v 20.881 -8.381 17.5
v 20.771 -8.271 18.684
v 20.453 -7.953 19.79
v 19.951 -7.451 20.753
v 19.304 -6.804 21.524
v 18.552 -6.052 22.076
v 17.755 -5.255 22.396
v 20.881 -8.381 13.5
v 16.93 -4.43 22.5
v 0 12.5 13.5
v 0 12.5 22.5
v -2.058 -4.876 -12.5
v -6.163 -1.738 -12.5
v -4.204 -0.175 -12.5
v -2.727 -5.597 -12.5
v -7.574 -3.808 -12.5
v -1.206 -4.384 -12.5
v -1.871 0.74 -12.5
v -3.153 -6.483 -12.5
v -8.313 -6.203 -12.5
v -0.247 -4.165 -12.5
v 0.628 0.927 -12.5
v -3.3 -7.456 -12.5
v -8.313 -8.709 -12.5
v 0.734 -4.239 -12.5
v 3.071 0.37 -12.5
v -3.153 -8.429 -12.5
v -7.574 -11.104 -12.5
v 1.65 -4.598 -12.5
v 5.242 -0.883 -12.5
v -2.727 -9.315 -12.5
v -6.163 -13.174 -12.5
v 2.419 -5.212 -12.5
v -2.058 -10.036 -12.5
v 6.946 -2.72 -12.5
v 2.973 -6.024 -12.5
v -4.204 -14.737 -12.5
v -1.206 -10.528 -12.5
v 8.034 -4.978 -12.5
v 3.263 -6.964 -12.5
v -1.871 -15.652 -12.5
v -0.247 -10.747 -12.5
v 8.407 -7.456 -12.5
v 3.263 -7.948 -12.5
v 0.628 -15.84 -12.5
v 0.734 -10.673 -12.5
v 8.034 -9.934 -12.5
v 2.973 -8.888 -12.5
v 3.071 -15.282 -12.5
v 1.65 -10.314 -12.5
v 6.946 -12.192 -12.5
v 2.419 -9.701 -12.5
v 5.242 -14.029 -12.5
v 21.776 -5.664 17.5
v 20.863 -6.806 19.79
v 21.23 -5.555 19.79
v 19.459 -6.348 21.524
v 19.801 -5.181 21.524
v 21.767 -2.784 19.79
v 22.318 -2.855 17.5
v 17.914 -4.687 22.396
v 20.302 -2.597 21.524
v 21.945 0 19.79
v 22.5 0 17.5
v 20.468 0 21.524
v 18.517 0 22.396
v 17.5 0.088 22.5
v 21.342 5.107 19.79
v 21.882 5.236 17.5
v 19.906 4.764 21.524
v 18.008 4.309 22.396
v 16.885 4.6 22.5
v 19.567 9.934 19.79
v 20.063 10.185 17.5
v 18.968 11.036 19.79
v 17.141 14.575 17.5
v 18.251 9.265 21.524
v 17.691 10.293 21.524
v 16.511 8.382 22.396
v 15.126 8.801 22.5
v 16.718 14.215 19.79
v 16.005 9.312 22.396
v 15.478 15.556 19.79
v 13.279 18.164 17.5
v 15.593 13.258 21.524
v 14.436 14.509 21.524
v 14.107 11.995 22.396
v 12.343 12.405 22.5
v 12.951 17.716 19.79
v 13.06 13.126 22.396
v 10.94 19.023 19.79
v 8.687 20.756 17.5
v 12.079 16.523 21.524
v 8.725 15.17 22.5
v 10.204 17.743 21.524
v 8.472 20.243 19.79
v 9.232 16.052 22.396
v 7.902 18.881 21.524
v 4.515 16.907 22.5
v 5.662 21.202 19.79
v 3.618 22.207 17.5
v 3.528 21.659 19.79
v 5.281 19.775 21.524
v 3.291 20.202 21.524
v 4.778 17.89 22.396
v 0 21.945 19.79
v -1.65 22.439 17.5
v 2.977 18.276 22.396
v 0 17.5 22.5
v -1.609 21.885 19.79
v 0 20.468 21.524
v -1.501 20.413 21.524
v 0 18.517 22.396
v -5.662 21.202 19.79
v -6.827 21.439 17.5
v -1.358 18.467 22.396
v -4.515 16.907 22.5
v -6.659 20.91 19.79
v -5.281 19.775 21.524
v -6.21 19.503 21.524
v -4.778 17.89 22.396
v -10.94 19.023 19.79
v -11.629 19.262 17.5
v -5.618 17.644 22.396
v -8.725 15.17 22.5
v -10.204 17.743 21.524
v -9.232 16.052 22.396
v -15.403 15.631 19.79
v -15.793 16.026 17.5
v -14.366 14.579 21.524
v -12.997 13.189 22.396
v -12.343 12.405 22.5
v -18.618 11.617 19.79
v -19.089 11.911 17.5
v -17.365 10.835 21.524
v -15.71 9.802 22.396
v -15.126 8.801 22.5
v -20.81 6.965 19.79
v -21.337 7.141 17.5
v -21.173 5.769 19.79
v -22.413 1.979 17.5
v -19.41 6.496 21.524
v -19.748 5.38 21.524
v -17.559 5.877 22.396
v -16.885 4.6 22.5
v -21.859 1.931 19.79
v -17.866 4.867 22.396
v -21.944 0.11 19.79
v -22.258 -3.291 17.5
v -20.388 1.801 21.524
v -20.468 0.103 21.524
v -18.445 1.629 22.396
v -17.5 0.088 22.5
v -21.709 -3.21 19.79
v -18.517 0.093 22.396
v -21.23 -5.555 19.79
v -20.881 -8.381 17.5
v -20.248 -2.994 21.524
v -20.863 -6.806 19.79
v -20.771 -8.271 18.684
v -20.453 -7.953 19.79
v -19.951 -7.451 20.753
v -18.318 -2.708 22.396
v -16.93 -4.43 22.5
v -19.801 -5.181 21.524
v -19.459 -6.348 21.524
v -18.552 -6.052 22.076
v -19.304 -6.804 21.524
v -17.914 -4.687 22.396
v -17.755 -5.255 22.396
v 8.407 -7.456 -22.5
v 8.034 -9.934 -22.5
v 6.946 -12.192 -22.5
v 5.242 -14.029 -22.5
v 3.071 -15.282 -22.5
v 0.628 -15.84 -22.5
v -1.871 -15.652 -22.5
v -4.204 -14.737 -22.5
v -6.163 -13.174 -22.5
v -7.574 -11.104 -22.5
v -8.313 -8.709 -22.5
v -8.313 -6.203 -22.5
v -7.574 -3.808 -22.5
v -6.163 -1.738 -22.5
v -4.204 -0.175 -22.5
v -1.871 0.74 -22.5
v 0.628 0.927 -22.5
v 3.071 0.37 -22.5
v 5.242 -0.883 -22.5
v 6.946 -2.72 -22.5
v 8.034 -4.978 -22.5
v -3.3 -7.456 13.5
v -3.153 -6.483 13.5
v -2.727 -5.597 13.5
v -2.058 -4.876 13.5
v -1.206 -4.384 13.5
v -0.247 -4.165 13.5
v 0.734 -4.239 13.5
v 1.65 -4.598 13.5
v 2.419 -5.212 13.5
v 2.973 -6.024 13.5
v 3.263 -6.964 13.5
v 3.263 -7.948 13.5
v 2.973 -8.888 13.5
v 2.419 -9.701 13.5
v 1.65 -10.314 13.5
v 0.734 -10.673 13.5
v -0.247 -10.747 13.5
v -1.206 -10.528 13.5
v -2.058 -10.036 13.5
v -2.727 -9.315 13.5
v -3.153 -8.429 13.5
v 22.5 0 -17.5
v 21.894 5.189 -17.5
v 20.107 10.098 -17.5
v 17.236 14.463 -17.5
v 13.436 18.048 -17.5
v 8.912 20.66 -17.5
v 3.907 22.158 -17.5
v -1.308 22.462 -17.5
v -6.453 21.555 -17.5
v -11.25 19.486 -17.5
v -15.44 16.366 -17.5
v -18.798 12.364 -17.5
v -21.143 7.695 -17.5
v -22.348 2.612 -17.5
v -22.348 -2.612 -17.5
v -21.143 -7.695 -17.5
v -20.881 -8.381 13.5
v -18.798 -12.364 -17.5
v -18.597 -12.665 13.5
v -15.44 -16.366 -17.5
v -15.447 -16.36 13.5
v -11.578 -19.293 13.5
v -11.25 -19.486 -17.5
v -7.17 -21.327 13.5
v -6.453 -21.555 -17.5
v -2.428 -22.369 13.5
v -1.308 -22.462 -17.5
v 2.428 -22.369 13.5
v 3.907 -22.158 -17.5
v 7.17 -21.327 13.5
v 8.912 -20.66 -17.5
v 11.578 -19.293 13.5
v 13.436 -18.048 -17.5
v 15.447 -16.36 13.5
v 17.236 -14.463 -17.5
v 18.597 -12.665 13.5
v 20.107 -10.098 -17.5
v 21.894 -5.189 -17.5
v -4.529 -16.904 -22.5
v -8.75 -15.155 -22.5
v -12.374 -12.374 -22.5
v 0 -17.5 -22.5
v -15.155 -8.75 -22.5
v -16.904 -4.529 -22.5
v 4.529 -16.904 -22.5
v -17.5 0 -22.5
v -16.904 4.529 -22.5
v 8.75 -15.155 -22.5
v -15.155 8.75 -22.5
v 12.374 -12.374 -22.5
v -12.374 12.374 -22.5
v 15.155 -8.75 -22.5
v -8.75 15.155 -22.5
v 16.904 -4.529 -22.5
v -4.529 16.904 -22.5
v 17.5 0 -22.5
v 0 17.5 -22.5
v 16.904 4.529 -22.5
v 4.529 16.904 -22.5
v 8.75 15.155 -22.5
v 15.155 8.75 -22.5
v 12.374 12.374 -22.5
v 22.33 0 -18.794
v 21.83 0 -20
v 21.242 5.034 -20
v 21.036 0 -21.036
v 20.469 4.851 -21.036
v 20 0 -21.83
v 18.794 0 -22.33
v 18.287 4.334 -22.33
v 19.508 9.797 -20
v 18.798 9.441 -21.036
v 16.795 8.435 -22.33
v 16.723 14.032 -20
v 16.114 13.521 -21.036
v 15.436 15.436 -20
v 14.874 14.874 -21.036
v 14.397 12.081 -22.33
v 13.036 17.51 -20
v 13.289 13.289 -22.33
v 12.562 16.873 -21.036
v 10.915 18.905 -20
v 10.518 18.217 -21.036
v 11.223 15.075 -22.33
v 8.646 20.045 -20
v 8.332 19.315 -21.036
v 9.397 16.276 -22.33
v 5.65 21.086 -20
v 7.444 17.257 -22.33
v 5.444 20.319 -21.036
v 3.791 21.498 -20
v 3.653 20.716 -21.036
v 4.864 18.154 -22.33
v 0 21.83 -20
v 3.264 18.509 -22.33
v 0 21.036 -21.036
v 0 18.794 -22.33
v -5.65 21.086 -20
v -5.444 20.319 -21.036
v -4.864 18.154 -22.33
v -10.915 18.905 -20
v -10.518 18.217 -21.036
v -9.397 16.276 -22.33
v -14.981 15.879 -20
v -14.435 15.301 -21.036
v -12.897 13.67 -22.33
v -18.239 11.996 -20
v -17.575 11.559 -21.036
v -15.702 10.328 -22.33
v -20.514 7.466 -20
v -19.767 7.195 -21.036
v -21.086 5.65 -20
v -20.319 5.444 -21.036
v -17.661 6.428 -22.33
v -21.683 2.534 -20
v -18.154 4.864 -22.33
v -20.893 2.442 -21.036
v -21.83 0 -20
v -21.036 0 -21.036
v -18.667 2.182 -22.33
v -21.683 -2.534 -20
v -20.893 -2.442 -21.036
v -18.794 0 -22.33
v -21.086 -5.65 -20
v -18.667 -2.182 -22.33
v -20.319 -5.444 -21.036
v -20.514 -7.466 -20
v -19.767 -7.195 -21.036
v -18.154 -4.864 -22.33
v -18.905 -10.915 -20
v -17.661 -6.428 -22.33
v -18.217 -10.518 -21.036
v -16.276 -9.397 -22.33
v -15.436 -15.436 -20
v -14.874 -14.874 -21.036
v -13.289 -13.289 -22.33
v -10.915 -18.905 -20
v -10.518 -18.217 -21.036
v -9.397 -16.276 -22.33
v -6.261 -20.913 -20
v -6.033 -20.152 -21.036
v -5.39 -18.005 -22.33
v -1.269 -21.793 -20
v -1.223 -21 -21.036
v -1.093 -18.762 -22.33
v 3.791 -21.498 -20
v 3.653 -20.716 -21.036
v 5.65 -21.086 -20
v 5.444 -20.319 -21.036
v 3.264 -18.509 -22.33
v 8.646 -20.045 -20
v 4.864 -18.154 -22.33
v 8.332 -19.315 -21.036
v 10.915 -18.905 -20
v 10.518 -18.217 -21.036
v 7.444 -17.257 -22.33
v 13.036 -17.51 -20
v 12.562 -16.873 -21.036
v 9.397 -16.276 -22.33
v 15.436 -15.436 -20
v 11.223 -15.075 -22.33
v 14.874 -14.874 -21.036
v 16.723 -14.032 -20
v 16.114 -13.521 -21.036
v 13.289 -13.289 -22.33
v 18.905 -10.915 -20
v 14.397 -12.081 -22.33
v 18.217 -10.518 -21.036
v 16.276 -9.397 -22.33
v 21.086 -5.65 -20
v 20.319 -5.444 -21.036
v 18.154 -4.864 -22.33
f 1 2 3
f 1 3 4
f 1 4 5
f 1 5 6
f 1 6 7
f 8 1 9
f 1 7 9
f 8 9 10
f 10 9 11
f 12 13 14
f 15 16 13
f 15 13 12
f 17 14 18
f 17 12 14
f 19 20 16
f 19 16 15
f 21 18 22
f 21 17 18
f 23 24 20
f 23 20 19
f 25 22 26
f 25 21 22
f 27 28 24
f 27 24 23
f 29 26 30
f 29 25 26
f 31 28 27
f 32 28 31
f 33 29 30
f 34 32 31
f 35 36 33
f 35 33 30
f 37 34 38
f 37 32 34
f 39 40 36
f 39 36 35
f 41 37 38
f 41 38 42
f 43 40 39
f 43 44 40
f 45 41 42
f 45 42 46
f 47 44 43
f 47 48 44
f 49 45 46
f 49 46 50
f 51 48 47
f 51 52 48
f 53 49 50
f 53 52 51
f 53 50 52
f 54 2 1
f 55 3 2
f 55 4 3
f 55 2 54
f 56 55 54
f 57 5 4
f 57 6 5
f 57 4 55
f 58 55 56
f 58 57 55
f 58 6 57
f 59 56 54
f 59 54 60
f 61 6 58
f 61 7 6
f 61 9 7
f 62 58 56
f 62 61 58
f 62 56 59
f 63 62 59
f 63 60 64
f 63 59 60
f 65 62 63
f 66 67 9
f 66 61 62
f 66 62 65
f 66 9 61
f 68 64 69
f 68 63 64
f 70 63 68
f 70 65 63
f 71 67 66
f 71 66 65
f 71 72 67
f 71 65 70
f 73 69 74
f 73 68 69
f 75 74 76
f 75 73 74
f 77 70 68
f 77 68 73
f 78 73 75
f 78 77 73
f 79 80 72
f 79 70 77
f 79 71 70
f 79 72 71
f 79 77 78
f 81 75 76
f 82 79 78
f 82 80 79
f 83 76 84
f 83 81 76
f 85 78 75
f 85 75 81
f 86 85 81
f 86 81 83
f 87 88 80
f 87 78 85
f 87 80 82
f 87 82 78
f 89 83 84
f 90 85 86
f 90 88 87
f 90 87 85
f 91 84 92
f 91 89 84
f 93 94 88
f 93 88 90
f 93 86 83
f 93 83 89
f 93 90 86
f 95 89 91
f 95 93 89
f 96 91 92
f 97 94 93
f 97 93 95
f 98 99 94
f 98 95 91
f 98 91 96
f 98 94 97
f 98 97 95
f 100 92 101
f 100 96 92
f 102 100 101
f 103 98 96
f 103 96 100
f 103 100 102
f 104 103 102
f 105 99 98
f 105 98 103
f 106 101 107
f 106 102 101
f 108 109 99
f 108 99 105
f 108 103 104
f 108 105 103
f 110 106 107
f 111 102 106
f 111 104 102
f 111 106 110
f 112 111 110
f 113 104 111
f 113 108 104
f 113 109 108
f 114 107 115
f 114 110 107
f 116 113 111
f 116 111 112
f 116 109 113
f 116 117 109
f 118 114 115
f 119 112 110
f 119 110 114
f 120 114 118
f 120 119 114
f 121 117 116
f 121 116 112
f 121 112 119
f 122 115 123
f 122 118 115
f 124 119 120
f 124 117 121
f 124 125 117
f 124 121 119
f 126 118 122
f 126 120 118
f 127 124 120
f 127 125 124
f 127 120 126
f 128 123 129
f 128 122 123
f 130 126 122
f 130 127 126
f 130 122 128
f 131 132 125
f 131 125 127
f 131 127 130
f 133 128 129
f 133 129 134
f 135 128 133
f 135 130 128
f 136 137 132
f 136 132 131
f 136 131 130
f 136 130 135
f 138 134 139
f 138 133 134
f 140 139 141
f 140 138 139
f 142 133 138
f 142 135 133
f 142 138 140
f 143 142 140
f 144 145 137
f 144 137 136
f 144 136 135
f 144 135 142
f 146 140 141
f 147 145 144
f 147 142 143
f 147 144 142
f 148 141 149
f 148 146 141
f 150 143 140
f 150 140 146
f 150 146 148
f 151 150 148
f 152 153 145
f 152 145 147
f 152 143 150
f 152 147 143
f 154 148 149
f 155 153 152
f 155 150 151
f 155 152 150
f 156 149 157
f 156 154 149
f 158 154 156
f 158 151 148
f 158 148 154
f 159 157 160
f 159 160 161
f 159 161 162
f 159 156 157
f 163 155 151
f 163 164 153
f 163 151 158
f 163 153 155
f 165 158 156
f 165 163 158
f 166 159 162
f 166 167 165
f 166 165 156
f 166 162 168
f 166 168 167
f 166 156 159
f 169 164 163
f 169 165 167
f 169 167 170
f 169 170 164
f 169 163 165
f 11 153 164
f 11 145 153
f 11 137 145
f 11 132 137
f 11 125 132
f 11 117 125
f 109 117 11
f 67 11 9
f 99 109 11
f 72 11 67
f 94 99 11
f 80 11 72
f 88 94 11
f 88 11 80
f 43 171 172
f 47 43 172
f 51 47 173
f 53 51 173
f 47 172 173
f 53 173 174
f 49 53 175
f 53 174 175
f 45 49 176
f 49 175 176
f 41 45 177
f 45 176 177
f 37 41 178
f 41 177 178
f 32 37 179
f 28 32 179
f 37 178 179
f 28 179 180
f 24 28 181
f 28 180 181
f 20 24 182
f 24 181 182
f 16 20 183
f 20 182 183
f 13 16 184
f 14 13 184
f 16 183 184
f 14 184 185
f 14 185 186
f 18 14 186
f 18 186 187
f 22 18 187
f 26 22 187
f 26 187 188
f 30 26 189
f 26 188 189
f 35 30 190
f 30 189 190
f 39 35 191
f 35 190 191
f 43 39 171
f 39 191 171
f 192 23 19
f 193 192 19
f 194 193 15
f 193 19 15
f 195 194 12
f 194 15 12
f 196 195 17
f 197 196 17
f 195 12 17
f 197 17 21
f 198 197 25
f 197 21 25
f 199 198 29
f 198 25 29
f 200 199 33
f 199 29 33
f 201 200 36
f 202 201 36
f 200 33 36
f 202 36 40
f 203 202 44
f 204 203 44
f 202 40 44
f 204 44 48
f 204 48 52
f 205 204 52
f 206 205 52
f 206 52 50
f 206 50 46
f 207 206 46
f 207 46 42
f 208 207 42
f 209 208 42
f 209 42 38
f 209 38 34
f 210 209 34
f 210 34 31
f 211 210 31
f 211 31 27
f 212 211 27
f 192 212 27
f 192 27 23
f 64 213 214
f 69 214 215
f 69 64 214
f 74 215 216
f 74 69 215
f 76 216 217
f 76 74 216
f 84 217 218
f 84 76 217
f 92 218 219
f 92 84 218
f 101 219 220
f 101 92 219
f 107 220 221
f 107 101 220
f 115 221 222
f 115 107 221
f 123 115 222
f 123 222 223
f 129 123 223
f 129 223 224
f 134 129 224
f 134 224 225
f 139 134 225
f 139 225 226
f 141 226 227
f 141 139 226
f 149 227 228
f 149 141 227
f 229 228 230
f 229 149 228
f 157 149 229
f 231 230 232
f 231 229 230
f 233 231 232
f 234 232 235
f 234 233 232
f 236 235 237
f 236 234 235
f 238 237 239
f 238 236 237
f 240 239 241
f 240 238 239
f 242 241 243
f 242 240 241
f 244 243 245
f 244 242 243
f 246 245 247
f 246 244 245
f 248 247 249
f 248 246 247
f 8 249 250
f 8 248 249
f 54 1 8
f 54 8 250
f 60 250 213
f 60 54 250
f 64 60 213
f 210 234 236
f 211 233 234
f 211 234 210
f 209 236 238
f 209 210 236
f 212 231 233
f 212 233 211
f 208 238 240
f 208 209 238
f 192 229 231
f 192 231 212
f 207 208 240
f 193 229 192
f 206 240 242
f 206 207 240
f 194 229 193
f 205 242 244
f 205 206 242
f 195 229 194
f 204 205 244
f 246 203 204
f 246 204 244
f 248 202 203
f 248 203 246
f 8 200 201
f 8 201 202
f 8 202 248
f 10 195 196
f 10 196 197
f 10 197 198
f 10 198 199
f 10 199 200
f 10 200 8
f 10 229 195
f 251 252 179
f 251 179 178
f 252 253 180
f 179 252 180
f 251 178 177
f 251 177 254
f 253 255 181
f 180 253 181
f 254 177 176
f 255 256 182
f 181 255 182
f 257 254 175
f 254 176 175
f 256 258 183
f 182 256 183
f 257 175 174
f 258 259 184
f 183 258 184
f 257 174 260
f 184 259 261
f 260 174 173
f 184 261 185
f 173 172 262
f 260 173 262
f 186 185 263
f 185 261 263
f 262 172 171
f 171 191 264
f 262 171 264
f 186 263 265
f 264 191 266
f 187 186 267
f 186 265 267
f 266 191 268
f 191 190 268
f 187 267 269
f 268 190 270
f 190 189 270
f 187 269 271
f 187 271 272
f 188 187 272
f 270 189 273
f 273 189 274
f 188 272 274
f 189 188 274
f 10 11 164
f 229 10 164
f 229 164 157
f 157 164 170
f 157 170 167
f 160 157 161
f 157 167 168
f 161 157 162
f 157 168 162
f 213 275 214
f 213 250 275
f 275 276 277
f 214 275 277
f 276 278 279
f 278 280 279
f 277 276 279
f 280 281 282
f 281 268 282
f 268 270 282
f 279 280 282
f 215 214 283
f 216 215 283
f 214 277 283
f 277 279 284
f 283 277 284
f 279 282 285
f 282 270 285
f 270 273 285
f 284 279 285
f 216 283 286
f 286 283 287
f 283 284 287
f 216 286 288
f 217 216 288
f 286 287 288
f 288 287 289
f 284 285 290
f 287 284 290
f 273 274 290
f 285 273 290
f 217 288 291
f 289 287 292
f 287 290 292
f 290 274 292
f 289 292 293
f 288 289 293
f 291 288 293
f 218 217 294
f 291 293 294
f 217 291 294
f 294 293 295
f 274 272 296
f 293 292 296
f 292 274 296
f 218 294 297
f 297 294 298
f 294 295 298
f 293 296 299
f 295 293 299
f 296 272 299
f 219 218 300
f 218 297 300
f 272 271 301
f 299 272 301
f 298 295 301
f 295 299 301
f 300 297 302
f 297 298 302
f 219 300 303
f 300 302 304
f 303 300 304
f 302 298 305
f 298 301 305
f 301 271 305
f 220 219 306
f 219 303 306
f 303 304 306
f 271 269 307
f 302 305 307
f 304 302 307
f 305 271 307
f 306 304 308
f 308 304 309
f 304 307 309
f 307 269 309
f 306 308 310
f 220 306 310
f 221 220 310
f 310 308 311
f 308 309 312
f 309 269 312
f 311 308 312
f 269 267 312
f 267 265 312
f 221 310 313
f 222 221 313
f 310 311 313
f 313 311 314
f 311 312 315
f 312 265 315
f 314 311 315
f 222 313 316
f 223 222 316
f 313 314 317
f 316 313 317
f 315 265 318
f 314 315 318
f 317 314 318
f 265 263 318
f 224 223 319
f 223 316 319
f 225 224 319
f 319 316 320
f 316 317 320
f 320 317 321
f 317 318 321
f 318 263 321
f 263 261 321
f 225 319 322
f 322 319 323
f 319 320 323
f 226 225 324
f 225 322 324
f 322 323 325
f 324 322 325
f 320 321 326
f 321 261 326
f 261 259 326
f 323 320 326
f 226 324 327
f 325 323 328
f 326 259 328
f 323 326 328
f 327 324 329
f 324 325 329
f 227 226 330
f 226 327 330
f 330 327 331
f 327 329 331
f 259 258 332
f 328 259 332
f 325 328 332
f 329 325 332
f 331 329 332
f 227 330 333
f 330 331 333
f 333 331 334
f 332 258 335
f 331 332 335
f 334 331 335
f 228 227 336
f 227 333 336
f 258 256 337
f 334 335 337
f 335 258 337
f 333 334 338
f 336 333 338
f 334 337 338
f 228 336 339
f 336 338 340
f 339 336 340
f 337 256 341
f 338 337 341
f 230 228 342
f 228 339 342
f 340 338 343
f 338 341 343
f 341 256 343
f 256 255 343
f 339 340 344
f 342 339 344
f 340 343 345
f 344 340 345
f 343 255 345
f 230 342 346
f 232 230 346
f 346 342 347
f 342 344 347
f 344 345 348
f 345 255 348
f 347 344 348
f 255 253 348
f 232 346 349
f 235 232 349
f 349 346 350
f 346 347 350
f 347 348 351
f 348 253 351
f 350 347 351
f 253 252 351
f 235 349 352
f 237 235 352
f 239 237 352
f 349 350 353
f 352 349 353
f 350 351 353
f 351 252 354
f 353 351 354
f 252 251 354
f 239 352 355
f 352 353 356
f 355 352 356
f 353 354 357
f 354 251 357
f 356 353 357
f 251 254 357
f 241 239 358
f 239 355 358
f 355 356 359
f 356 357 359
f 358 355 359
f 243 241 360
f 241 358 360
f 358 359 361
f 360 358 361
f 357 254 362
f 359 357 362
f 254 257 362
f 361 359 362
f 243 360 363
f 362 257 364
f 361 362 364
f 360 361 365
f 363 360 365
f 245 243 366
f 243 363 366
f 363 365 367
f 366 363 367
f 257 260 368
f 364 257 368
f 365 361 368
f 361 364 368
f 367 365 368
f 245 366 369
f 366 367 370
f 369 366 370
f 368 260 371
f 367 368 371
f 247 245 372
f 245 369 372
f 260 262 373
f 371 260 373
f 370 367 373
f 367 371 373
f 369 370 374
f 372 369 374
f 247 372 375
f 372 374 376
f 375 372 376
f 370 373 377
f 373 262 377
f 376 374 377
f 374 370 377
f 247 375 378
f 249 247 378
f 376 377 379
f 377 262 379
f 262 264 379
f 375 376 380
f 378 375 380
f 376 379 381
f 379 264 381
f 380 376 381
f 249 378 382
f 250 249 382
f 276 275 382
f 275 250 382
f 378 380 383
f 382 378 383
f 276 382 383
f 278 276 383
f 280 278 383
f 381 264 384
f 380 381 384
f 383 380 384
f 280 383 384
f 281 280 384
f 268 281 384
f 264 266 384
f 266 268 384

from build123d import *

# Parameters (mm, degrees)
F0_R     = 22.5
F1_DEPTH = 22.5
F3_DEPTH = 9
F4_R     = 5
F5_R     = 5
F7_D     = 6.6
F8_R     = 8.4070446973
F8_R_2   = 3.3
F9_DEPTH = 10


with BuildPart() as f1:
    # F0 (on Top) → F1 (new body, symmetric)
    with BuildSketch(Plane.XY):
        Circle(F0_R)
    extrude(amount=F1_DEPTH, both=True)

    # F2 (on face) → F3 (cut)
    with BuildSketch(Plane.XY.offset(22.5)):
        with BuildLine():
            Line((20.8808748884, -8.3808748884), (0, 12.5))
            Line((0, 12.5), (-20.8808748884, -8.3808748884))
            ThreePointArc((-20.8808748884, -8.3808748884), (0, -22.5), (20.8808748884, -8.3808748884))
        make_face()
    extrude(amount=-F3_DEPTH, mode=Mode.SUBTRACT)

    # F4
    f4_edges = [f1.edges().sort_by_distance(p)[0] for p in [
        (-22.5, 0, -22.5),
    ]]
    fillet(f4_edges, radius=F4_R)

    # F5
    f5_edges = [f1.edges().sort_by_distance(p)[0] for p in [
        (-4.267922, 22.091511, 22.5),
    ]]
    fillet(f5_edges, radius=F5_R)

    # F7 (through all)
    with Locations(Plane.XY.offset(13.5)):
        with Locations((0, -7.456140127)):
            Hole(F7_D / 2)

    # F8 (on face) → F9 (cut)
    with BuildSketch(Plane(origin=(0, 0, -22.5), x_dir=(1, 0, 0), z_dir=(0, 0, -1))):
        with Locations((0, 7.456140127)):
            Circle(F8_R)
        with Locations((0, 7.456140127)):
            Circle(F8_R_2, mode=Mode.SUBTRACT)
    extrude(amount=-F9_DEPTH, mode=Mode.SUBTRACT)


solid = f1.part
